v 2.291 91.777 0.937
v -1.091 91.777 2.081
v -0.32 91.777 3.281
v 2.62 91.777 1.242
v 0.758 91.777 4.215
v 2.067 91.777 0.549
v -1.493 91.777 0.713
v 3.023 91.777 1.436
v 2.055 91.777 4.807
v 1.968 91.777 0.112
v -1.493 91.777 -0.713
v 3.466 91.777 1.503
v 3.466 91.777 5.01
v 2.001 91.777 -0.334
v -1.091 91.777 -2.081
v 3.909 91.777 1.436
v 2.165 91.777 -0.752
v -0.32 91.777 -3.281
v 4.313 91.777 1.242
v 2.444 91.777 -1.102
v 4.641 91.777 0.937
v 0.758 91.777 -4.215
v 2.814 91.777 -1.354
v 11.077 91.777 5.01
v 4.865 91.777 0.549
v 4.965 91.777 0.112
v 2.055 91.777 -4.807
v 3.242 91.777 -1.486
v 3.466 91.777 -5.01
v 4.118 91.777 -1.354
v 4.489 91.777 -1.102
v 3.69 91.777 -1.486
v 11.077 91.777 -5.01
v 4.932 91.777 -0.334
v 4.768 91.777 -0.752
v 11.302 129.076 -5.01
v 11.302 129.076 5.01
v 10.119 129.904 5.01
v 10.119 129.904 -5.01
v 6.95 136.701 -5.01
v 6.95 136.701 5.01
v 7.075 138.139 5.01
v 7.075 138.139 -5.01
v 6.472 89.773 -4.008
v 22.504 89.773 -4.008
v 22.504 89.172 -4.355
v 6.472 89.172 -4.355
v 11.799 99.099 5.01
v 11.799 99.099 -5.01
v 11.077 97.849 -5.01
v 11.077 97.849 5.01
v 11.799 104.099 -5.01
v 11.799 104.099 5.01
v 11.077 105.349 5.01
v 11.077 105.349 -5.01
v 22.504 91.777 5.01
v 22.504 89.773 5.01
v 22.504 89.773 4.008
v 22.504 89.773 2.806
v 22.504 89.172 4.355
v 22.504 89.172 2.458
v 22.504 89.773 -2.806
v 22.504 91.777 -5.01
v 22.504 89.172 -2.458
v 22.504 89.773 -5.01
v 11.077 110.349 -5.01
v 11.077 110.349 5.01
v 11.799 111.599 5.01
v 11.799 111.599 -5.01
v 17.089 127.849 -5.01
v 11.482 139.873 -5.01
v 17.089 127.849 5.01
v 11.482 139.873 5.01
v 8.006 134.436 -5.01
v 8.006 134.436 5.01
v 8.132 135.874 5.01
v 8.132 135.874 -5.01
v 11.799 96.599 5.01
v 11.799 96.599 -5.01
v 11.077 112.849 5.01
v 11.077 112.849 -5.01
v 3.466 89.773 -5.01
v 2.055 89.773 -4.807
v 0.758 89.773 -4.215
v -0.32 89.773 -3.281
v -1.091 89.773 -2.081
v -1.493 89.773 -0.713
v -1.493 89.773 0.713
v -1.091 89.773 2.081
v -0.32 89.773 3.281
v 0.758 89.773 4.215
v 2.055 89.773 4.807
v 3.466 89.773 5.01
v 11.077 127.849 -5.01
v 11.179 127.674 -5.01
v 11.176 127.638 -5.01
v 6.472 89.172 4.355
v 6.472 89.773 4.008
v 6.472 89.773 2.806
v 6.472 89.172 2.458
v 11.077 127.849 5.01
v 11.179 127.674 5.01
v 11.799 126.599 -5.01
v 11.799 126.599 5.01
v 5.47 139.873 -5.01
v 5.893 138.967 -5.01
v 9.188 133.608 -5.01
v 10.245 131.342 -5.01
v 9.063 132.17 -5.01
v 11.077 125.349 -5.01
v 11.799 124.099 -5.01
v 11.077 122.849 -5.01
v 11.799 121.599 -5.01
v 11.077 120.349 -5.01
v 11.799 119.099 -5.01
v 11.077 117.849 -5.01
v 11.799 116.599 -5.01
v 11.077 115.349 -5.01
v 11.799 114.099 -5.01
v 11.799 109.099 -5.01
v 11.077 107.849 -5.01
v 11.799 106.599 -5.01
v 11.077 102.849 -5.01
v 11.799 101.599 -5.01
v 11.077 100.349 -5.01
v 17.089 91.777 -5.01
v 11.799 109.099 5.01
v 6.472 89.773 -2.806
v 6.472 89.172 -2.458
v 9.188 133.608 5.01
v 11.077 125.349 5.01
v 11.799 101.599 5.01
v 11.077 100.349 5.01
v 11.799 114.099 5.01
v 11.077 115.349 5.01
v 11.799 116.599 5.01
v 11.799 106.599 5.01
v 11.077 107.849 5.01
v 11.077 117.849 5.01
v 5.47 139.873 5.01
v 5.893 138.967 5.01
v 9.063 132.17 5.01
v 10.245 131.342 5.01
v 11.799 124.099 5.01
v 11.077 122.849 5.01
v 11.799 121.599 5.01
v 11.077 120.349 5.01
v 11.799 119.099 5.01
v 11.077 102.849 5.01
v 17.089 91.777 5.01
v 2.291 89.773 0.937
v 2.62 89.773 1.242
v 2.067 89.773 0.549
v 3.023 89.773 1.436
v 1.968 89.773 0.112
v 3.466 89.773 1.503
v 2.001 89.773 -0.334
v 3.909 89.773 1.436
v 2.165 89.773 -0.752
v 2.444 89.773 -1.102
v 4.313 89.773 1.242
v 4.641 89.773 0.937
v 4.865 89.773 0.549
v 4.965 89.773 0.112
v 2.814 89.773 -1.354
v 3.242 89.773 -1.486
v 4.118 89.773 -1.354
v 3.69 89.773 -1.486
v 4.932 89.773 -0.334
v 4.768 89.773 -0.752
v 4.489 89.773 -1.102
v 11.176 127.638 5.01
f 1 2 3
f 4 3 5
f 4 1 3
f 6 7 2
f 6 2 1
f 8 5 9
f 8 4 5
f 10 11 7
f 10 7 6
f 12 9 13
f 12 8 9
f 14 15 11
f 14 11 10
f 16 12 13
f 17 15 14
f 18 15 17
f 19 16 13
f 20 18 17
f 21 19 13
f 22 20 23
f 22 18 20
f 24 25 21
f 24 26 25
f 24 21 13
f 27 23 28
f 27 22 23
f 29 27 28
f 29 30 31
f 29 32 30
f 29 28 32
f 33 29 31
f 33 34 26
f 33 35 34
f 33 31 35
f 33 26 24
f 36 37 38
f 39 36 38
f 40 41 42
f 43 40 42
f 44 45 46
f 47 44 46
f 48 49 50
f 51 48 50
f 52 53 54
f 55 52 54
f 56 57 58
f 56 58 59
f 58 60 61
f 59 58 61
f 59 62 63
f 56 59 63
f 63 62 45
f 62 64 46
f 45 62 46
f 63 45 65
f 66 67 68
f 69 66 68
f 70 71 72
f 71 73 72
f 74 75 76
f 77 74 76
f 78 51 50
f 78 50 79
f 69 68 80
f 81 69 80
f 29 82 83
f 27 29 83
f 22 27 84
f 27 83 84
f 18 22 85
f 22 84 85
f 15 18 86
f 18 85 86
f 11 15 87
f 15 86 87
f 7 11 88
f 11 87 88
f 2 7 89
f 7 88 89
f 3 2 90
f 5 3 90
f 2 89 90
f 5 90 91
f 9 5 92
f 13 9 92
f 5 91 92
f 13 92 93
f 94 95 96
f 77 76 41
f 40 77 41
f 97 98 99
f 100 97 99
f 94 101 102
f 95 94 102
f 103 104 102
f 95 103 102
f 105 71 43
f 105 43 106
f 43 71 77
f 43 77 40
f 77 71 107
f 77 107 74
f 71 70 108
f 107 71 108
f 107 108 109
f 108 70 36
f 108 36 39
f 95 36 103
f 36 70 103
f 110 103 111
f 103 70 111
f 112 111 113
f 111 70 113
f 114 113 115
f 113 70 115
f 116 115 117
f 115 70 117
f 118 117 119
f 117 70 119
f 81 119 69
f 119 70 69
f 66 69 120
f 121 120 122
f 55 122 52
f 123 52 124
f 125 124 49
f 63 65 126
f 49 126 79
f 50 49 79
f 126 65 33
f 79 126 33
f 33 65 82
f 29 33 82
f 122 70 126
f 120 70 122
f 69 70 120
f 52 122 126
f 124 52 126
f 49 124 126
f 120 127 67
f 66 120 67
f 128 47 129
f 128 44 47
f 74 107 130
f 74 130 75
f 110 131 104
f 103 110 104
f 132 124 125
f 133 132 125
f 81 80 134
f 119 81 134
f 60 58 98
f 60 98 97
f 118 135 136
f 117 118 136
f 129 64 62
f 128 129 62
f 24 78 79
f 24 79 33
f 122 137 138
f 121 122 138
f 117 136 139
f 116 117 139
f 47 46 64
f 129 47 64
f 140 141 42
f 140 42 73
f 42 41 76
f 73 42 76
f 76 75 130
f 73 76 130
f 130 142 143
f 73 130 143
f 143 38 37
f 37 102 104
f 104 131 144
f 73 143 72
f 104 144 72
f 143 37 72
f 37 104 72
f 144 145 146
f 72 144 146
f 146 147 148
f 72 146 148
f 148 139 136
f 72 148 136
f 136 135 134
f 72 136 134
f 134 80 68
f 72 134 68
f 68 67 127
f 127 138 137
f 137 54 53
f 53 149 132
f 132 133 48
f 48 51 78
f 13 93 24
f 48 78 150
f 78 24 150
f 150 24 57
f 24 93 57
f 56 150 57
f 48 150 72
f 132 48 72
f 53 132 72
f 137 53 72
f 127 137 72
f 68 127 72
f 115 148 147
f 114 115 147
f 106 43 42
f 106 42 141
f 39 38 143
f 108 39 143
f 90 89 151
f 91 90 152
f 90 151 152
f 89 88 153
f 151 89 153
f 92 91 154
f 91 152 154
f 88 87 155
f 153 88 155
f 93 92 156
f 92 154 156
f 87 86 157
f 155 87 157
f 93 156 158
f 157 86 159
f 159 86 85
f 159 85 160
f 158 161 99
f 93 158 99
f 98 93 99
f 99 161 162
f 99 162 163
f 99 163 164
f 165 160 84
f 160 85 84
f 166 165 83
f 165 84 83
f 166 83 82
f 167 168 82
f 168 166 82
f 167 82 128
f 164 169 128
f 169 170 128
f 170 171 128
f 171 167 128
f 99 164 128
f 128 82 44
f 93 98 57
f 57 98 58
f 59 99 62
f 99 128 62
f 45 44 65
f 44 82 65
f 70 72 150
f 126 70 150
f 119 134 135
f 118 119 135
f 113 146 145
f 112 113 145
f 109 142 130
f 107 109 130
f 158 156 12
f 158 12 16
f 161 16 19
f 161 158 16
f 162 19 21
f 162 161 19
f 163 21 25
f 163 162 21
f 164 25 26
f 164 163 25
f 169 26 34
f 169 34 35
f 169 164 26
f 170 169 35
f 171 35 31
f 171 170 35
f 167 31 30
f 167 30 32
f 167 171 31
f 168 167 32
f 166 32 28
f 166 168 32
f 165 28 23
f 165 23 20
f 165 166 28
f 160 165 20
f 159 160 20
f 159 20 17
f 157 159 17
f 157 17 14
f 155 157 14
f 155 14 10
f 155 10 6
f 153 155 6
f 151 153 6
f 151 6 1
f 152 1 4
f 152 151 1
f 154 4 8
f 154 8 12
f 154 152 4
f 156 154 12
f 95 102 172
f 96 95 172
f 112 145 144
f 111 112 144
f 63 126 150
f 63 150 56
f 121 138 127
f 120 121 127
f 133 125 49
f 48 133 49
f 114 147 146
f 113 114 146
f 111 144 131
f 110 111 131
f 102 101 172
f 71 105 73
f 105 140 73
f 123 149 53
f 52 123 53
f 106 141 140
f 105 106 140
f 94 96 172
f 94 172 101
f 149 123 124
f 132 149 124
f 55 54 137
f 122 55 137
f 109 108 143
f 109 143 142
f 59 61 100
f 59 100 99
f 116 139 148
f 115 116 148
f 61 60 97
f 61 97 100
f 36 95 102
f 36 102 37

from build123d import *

# Parameters (mm, degrees)
SKETCH1_R           = 7.5
BOSS_EXTRUDE1_DEPTH = 10
BOSS_EXTRUDE2_DEPTH = 80
BOSS_EXTRUDE3_DEPTH = 25
SCALE2_SCALE        = 0.2004
CUT_EXTRUDE9_DEPTH  = 20
CUT_EXTRUDE10_DEPTH = 20


with BuildPart() as part:
    # Sketch1 → Boss-Extrude1 (new body)
    with BuildSketch(Plane(origin=(0, 0, 0), x_dir=(1, 0, 0), z_dir=(0, 1, 0))):
        with BuildLine():
            Line((60, 25), (-35, 25))
            ThreePointArc((-35, 25), (-60, 0), (-35, -25))
            Line((-35, -25), (60, -25))
            Line((60, -25), (60, 25))
        make_face()
        with Locations(Location((-35, 0, 0), (0, 0, 270))):
            Circle(SKETCH1_R, mode=Mode.SUBTRACT)
    extrude(amount=BOSS_EXTRUDE1_DEPTH)

    # Sketch2 → Boss-Extrude2 (add)
    with BuildSketch(Plane(origin=(60, 0, 0), x_dir=(0, 0, -1), z_dir=(1, 0, 0))):
        Polygon((-20, 0), (-21.732050808, -3), (-12.267949192, -3), (-14, 0), align=None)
        Polygon((21.732050808, -3), (12.267949192, -3), (14, 0), (20, 0), align=None)
    extrude(amount=-BOSS_EXTRUDE2_DEPTH)

    # Sketch3 → Boss-Extrude3 (add, symmetric)
    with BuildSketch(Plane.XY):
        Polygon((2.978459489, 10), (2.978459489, 190), (-25, 250), (5, 250), (32.978459489, 190), (32.978459489, 10), align=None)
    extrude(amount=BOSS_EXTRUDE3_DEPTH, both=True)


with BuildPart() as part_1:
    # Scale2: scaled about (13.107002059, 112.272995935, 0)
    add(part.part.scale(SCALE2_SCALE).moved(Location((10.480358846, 89.77348755, 0))))

    # Sketch9 → Cut-Extrude9 (cut)
    with BuildSketch(Plane.XY.offset(5.01)):
        Polygon((11.798929964, 106.59948755), (11.077242128, 107.84948755), (11.077242128, 105.34948755), align=None)
        Polygon((11.798929964, 109.09948755), (11.077242128, 110.34948755), (11.077242128, 107.84948755), align=None)
        Polygon((11.798929964, 104.09948755), (11.077242128, 105.34948755), (11.077242128, 102.84948755), align=None)
        Polygon((11.798929964, 114.09948755), (11.077242128, 115.34948755), (11.077242128, 112.84948755), align=None)
        Polygon((11.798929964, 111.59948755), (11.077242128, 112.84948755), (11.077242128, 110.34948755), align=None)
        Polygon((11.798929964, 116.59948755), (11.077242128, 117.84948755), (11.077242128, 115.34948755), align=None)
        Polygon((11.798929964, 119.09948755), (11.077242128, 120.34948755), (11.077242128, 117.84948755), align=None)
        Polygon((11.798929964, 121.59948755), (11.077242128, 122.84948755), (11.077242128, 120.34948755), align=None)
        Polygon((11.798929964, 124.09948755), (11.077242128, 125.34948755), (11.077242128, 122.84948755), align=None)
        Polygon((11.17570538, 127.638332425), (11.077242128, 127.84948755), (11.077242128, 125.34948755), (11.798929964, 126.59948755), (11.178790887, 127.673599939), align=None)
        Polygon((10.119159725, 129.904101892), (11.077242128, 127.84948755), (11.178790887, 127.673599939), (11.301503859, 129.076215618), align=None)
        Polygon((9.062614071, 132.16987136), (10.119159725, 129.904101892), (10.244958204, 131.341985085), align=None)
        Polygon((8.006068417, 134.435640828), (9.062614071, 132.16987136), (9.18841255, 133.607754553), align=None)
        Polygon((6.949522762, 136.701410295), (8.006068417, 134.435640828), (8.131866896, 135.87352402), align=None)
        Polygon((5.892977108, 138.967179763), (6.949522762, 136.701410295), (7.075321241, 138.139293488), align=None)
        Polygon((11.077242128, 97.84948755), (11.798929964, 96.59948755), (11.077242128, 91.77748755), align=None)
    extrude(amount=-CUT_EXTRUDE9_DEPTH, mode=Mode.SUBTRACT)


with BuildPart() as cut_extrude9_piece_1:
    # of the separate pieces the step leaves, piece 1, a body of its own (cut_extrude9_pieces)
    add(part_1.part.solids().sort_by_distance((3.466358846, 89.77348755, 5.01))[0])

    # Sketch10 → Cut-Extrude10 (cut)
    with BuildSketch(Plane(origin=(0, 0, -5.01), x_dir=(-1, 0, 0), z_dir=(0, 0, -1))):
        Polygon((-11.077242128, 100.34948755), (-11.077242128, 102.84948755), (-11.798929964, 101.59948755), align=None)
        Polygon((-11.077242128, 97.84948755), (-11.077242128, 100.34948755), (-11.798929964, 99.09948755), align=None)
    extrude(amount=-CUT_EXTRUDE10_DEPTH, mode=Mode.SUBTRACT)


with BuildPart() as cut_extrude9_piece_2:
    # of the separate pieces the step leaves, piece 2, a body of its own (cut_extrude9_pieces)
    add(part_1.part.solids().sort_by_distance((11.17570538, 127.638332425, 5.01))[0])


solid = Compound([cut_extrude9_piece_1.part, cut_extrude9_piece_2.part])
